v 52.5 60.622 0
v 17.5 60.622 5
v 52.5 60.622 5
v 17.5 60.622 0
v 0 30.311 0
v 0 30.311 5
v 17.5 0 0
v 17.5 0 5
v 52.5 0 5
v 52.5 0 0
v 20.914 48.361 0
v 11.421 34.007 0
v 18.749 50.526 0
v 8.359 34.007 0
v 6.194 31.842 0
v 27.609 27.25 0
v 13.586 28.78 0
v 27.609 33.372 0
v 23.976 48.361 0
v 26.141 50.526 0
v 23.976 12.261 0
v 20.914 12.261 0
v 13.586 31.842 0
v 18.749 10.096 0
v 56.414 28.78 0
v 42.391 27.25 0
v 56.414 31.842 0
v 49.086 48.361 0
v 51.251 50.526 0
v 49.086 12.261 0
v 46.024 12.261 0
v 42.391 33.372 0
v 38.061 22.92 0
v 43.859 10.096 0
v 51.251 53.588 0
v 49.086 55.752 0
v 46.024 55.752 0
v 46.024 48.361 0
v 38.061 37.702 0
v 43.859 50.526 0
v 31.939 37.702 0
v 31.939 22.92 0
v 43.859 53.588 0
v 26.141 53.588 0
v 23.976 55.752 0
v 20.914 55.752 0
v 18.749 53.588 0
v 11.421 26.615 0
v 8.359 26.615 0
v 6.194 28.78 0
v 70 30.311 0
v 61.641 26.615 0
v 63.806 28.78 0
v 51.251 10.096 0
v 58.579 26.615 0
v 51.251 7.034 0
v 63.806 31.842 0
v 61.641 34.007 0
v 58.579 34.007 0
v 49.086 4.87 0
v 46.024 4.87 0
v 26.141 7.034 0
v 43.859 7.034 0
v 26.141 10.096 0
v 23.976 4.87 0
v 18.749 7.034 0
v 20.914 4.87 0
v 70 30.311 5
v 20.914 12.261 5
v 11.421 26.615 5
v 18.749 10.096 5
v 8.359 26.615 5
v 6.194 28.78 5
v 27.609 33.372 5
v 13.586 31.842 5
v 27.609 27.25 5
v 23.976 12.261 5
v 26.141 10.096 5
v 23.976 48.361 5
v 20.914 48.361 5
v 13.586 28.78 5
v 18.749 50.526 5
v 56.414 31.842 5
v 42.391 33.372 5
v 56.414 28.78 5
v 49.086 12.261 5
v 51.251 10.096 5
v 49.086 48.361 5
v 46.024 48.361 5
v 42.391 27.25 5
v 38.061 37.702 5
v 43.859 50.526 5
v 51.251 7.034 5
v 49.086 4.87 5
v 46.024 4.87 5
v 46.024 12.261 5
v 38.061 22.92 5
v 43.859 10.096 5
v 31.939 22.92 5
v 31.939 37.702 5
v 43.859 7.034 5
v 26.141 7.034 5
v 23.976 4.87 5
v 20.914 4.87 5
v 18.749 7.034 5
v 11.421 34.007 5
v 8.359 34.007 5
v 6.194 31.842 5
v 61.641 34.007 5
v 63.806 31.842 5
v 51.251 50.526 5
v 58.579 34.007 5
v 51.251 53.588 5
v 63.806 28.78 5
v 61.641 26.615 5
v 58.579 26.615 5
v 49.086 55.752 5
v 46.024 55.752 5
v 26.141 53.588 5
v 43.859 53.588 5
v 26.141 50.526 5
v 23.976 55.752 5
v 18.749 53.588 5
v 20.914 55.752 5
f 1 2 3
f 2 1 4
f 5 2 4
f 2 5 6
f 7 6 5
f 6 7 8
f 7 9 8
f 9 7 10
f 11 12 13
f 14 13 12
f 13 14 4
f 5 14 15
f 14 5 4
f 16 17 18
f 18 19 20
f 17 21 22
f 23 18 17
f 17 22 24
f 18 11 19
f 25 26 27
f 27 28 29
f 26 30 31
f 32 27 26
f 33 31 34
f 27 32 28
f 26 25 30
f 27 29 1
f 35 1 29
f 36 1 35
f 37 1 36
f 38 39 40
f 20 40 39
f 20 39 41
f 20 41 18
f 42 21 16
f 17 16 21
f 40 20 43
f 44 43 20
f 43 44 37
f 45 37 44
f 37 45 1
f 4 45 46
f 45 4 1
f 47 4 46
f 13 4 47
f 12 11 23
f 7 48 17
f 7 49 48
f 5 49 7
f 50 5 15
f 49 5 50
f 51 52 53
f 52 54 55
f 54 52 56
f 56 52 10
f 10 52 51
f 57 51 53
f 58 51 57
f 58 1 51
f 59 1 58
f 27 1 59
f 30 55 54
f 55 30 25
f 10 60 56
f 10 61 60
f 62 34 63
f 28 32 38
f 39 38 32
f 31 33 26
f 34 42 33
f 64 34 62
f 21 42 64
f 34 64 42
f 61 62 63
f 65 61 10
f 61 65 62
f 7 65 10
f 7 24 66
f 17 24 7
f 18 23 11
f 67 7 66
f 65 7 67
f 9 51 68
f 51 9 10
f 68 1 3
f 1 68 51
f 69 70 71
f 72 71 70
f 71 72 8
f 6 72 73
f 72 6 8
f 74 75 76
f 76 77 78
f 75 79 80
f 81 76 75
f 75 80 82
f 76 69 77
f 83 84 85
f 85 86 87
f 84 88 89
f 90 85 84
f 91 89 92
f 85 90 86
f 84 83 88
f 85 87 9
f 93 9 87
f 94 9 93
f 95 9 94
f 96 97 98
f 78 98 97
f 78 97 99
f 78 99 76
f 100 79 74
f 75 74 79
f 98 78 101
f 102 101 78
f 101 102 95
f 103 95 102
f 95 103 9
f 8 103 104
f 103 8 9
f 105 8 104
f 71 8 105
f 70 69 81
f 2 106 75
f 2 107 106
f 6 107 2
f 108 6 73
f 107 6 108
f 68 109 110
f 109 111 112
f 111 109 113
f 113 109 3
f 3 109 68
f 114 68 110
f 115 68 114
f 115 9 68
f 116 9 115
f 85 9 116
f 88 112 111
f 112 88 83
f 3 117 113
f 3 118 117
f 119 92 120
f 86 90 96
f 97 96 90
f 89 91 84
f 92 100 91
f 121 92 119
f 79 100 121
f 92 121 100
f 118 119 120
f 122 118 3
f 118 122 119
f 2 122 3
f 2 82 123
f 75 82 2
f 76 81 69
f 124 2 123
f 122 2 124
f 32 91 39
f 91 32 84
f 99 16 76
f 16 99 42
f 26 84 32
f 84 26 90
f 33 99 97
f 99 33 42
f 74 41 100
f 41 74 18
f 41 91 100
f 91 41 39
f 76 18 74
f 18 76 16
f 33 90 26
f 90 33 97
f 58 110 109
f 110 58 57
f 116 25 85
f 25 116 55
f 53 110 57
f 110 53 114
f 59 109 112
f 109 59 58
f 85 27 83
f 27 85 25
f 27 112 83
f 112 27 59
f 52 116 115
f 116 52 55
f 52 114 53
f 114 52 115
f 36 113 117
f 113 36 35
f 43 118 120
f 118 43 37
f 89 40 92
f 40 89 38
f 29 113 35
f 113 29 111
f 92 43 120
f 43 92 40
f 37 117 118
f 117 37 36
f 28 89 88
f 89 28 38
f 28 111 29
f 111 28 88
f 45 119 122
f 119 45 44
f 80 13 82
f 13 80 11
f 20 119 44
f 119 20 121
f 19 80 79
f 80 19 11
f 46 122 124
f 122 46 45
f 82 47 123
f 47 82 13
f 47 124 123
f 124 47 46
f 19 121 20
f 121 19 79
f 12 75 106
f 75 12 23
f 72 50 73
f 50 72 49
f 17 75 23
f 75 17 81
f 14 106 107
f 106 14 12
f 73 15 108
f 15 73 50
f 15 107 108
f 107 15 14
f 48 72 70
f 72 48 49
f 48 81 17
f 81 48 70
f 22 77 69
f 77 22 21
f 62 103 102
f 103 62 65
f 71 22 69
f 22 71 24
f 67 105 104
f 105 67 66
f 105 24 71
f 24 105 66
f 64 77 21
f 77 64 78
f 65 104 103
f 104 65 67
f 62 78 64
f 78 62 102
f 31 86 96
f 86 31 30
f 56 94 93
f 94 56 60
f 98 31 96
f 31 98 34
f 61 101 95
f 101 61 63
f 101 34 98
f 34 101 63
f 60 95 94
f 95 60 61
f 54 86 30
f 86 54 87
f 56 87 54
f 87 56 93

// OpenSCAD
$fn = 32;

// ----------------------------------------------------------------------
// Polygon plate: 6-gon R35, 6 bolt windows
// ----------------------------------------------------------------------

// --- parameters (mm) ---
sides = 6;                // number of polygon sides
plate_r = 35;             // circumscribed radius of the polygon
bore_r = 8;               // centre bore radius
bolts = 6;                // number of bolt windows
ring_r = 25.11;           // bolt-circle radius
bolt_r = 4;               // bolt window radius
plate_t = 5;              // plate thickness, Z (extrusion height)

plate_d = 2 * plate_r;  // circumscribed diameter
bore_d = 2 * bore_r;  // centre bore diameter
bolt_d = 2 * bolt_r;  // bolt window diameter
ring_d = 2 * ring_r;  // bolt-circle diameter

profile = [[70, 30.311], [52.5, 60.622], [17.5, 60.622], [0, 30.311], [17.5, 0], [52.5, 0]];  // primary outline, 6 points, counter clockwise
void_1 = [[42.391, 33.372], [38.061, 37.702], [31.939, 37.702], [27.609, 33.372], [27.609, 27.25], [31.939, 22.92], [38.061, 22.92], [42.391, 27.25]];  // centre bore, 8 points
void_2 = [[63.806, 31.842], [61.641, 34.007], [58.579, 34.007], [56.414, 31.842], [56.414, 28.78], [58.579, 26.615], [61.641, 26.615], [63.806, 28.78]];  // bolt window 1, 8 points
void_3 = [[51.251, 53.588], [49.086, 55.752], [46.024, 55.752], [43.859, 53.588], [43.859, 50.526], [46.024, 48.361], [49.086, 48.361], [51.251, 50.526]];  // bolt window 2, 8 points
void_4 = [[26.141, 53.588], [23.976, 55.752], [20.914, 55.752], [18.749, 53.588], [18.749, 50.526], [20.914, 48.361], [23.976, 48.361], [26.141, 50.526]];  // bolt window 3, 8 points
void_5 = [[13.586, 31.842], [11.421, 34.007], [8.359, 34.007], [6.194, 31.842], [6.194, 28.78], [8.359, 26.615], [11.421, 26.615], [13.586, 28.78]];  // bolt window 4, 8 points
void_6 = [[26.141, 10.096], [23.976, 12.261], [20.914, 12.261], [18.749, 10.096], [18.749, 7.034], [20.914, 4.87], [23.976, 4.87], [26.141, 7.034]];  // bolt window 5, 8 points
void_7 = [[51.251, 10.096], [49.086, 12.261], [46.024, 12.261], [43.859, 10.096], [43.859, 7.034], [46.024, 4.87], [49.086, 4.87], [51.251, 7.034]];  // bolt window 6, 8 points

// --- the one profile operation ---
difference() {
  linear_extrude(height = plate_t) polygon(points = profile);
  translate([0, 0, -1])
    linear_extrude(height = plate_t + 2) polygon(points = void_1);
  translate([0, 0, -1])
    linear_extrude(height = plate_t + 2) polygon(points = void_2);
  translate([0, 0, -1])
    linear_extrude(height = plate_t + 2) polygon(points = void_3);
  translate([0, 0, -1])
    linear_extrude(height = plate_t + 2) polygon(points = void_4);
  translate([0, 0, -1])
    linear_extrude(height = plate_t + 2) polygon(points = void_5);
  translate([0, 0, -1])
    linear_extrude(height = plate_t + 2) polygon(points = void_6);
  translate([0, 0, -1])
    linear_extrude(height = plate_t + 2) polygon(points = void_7);
}
